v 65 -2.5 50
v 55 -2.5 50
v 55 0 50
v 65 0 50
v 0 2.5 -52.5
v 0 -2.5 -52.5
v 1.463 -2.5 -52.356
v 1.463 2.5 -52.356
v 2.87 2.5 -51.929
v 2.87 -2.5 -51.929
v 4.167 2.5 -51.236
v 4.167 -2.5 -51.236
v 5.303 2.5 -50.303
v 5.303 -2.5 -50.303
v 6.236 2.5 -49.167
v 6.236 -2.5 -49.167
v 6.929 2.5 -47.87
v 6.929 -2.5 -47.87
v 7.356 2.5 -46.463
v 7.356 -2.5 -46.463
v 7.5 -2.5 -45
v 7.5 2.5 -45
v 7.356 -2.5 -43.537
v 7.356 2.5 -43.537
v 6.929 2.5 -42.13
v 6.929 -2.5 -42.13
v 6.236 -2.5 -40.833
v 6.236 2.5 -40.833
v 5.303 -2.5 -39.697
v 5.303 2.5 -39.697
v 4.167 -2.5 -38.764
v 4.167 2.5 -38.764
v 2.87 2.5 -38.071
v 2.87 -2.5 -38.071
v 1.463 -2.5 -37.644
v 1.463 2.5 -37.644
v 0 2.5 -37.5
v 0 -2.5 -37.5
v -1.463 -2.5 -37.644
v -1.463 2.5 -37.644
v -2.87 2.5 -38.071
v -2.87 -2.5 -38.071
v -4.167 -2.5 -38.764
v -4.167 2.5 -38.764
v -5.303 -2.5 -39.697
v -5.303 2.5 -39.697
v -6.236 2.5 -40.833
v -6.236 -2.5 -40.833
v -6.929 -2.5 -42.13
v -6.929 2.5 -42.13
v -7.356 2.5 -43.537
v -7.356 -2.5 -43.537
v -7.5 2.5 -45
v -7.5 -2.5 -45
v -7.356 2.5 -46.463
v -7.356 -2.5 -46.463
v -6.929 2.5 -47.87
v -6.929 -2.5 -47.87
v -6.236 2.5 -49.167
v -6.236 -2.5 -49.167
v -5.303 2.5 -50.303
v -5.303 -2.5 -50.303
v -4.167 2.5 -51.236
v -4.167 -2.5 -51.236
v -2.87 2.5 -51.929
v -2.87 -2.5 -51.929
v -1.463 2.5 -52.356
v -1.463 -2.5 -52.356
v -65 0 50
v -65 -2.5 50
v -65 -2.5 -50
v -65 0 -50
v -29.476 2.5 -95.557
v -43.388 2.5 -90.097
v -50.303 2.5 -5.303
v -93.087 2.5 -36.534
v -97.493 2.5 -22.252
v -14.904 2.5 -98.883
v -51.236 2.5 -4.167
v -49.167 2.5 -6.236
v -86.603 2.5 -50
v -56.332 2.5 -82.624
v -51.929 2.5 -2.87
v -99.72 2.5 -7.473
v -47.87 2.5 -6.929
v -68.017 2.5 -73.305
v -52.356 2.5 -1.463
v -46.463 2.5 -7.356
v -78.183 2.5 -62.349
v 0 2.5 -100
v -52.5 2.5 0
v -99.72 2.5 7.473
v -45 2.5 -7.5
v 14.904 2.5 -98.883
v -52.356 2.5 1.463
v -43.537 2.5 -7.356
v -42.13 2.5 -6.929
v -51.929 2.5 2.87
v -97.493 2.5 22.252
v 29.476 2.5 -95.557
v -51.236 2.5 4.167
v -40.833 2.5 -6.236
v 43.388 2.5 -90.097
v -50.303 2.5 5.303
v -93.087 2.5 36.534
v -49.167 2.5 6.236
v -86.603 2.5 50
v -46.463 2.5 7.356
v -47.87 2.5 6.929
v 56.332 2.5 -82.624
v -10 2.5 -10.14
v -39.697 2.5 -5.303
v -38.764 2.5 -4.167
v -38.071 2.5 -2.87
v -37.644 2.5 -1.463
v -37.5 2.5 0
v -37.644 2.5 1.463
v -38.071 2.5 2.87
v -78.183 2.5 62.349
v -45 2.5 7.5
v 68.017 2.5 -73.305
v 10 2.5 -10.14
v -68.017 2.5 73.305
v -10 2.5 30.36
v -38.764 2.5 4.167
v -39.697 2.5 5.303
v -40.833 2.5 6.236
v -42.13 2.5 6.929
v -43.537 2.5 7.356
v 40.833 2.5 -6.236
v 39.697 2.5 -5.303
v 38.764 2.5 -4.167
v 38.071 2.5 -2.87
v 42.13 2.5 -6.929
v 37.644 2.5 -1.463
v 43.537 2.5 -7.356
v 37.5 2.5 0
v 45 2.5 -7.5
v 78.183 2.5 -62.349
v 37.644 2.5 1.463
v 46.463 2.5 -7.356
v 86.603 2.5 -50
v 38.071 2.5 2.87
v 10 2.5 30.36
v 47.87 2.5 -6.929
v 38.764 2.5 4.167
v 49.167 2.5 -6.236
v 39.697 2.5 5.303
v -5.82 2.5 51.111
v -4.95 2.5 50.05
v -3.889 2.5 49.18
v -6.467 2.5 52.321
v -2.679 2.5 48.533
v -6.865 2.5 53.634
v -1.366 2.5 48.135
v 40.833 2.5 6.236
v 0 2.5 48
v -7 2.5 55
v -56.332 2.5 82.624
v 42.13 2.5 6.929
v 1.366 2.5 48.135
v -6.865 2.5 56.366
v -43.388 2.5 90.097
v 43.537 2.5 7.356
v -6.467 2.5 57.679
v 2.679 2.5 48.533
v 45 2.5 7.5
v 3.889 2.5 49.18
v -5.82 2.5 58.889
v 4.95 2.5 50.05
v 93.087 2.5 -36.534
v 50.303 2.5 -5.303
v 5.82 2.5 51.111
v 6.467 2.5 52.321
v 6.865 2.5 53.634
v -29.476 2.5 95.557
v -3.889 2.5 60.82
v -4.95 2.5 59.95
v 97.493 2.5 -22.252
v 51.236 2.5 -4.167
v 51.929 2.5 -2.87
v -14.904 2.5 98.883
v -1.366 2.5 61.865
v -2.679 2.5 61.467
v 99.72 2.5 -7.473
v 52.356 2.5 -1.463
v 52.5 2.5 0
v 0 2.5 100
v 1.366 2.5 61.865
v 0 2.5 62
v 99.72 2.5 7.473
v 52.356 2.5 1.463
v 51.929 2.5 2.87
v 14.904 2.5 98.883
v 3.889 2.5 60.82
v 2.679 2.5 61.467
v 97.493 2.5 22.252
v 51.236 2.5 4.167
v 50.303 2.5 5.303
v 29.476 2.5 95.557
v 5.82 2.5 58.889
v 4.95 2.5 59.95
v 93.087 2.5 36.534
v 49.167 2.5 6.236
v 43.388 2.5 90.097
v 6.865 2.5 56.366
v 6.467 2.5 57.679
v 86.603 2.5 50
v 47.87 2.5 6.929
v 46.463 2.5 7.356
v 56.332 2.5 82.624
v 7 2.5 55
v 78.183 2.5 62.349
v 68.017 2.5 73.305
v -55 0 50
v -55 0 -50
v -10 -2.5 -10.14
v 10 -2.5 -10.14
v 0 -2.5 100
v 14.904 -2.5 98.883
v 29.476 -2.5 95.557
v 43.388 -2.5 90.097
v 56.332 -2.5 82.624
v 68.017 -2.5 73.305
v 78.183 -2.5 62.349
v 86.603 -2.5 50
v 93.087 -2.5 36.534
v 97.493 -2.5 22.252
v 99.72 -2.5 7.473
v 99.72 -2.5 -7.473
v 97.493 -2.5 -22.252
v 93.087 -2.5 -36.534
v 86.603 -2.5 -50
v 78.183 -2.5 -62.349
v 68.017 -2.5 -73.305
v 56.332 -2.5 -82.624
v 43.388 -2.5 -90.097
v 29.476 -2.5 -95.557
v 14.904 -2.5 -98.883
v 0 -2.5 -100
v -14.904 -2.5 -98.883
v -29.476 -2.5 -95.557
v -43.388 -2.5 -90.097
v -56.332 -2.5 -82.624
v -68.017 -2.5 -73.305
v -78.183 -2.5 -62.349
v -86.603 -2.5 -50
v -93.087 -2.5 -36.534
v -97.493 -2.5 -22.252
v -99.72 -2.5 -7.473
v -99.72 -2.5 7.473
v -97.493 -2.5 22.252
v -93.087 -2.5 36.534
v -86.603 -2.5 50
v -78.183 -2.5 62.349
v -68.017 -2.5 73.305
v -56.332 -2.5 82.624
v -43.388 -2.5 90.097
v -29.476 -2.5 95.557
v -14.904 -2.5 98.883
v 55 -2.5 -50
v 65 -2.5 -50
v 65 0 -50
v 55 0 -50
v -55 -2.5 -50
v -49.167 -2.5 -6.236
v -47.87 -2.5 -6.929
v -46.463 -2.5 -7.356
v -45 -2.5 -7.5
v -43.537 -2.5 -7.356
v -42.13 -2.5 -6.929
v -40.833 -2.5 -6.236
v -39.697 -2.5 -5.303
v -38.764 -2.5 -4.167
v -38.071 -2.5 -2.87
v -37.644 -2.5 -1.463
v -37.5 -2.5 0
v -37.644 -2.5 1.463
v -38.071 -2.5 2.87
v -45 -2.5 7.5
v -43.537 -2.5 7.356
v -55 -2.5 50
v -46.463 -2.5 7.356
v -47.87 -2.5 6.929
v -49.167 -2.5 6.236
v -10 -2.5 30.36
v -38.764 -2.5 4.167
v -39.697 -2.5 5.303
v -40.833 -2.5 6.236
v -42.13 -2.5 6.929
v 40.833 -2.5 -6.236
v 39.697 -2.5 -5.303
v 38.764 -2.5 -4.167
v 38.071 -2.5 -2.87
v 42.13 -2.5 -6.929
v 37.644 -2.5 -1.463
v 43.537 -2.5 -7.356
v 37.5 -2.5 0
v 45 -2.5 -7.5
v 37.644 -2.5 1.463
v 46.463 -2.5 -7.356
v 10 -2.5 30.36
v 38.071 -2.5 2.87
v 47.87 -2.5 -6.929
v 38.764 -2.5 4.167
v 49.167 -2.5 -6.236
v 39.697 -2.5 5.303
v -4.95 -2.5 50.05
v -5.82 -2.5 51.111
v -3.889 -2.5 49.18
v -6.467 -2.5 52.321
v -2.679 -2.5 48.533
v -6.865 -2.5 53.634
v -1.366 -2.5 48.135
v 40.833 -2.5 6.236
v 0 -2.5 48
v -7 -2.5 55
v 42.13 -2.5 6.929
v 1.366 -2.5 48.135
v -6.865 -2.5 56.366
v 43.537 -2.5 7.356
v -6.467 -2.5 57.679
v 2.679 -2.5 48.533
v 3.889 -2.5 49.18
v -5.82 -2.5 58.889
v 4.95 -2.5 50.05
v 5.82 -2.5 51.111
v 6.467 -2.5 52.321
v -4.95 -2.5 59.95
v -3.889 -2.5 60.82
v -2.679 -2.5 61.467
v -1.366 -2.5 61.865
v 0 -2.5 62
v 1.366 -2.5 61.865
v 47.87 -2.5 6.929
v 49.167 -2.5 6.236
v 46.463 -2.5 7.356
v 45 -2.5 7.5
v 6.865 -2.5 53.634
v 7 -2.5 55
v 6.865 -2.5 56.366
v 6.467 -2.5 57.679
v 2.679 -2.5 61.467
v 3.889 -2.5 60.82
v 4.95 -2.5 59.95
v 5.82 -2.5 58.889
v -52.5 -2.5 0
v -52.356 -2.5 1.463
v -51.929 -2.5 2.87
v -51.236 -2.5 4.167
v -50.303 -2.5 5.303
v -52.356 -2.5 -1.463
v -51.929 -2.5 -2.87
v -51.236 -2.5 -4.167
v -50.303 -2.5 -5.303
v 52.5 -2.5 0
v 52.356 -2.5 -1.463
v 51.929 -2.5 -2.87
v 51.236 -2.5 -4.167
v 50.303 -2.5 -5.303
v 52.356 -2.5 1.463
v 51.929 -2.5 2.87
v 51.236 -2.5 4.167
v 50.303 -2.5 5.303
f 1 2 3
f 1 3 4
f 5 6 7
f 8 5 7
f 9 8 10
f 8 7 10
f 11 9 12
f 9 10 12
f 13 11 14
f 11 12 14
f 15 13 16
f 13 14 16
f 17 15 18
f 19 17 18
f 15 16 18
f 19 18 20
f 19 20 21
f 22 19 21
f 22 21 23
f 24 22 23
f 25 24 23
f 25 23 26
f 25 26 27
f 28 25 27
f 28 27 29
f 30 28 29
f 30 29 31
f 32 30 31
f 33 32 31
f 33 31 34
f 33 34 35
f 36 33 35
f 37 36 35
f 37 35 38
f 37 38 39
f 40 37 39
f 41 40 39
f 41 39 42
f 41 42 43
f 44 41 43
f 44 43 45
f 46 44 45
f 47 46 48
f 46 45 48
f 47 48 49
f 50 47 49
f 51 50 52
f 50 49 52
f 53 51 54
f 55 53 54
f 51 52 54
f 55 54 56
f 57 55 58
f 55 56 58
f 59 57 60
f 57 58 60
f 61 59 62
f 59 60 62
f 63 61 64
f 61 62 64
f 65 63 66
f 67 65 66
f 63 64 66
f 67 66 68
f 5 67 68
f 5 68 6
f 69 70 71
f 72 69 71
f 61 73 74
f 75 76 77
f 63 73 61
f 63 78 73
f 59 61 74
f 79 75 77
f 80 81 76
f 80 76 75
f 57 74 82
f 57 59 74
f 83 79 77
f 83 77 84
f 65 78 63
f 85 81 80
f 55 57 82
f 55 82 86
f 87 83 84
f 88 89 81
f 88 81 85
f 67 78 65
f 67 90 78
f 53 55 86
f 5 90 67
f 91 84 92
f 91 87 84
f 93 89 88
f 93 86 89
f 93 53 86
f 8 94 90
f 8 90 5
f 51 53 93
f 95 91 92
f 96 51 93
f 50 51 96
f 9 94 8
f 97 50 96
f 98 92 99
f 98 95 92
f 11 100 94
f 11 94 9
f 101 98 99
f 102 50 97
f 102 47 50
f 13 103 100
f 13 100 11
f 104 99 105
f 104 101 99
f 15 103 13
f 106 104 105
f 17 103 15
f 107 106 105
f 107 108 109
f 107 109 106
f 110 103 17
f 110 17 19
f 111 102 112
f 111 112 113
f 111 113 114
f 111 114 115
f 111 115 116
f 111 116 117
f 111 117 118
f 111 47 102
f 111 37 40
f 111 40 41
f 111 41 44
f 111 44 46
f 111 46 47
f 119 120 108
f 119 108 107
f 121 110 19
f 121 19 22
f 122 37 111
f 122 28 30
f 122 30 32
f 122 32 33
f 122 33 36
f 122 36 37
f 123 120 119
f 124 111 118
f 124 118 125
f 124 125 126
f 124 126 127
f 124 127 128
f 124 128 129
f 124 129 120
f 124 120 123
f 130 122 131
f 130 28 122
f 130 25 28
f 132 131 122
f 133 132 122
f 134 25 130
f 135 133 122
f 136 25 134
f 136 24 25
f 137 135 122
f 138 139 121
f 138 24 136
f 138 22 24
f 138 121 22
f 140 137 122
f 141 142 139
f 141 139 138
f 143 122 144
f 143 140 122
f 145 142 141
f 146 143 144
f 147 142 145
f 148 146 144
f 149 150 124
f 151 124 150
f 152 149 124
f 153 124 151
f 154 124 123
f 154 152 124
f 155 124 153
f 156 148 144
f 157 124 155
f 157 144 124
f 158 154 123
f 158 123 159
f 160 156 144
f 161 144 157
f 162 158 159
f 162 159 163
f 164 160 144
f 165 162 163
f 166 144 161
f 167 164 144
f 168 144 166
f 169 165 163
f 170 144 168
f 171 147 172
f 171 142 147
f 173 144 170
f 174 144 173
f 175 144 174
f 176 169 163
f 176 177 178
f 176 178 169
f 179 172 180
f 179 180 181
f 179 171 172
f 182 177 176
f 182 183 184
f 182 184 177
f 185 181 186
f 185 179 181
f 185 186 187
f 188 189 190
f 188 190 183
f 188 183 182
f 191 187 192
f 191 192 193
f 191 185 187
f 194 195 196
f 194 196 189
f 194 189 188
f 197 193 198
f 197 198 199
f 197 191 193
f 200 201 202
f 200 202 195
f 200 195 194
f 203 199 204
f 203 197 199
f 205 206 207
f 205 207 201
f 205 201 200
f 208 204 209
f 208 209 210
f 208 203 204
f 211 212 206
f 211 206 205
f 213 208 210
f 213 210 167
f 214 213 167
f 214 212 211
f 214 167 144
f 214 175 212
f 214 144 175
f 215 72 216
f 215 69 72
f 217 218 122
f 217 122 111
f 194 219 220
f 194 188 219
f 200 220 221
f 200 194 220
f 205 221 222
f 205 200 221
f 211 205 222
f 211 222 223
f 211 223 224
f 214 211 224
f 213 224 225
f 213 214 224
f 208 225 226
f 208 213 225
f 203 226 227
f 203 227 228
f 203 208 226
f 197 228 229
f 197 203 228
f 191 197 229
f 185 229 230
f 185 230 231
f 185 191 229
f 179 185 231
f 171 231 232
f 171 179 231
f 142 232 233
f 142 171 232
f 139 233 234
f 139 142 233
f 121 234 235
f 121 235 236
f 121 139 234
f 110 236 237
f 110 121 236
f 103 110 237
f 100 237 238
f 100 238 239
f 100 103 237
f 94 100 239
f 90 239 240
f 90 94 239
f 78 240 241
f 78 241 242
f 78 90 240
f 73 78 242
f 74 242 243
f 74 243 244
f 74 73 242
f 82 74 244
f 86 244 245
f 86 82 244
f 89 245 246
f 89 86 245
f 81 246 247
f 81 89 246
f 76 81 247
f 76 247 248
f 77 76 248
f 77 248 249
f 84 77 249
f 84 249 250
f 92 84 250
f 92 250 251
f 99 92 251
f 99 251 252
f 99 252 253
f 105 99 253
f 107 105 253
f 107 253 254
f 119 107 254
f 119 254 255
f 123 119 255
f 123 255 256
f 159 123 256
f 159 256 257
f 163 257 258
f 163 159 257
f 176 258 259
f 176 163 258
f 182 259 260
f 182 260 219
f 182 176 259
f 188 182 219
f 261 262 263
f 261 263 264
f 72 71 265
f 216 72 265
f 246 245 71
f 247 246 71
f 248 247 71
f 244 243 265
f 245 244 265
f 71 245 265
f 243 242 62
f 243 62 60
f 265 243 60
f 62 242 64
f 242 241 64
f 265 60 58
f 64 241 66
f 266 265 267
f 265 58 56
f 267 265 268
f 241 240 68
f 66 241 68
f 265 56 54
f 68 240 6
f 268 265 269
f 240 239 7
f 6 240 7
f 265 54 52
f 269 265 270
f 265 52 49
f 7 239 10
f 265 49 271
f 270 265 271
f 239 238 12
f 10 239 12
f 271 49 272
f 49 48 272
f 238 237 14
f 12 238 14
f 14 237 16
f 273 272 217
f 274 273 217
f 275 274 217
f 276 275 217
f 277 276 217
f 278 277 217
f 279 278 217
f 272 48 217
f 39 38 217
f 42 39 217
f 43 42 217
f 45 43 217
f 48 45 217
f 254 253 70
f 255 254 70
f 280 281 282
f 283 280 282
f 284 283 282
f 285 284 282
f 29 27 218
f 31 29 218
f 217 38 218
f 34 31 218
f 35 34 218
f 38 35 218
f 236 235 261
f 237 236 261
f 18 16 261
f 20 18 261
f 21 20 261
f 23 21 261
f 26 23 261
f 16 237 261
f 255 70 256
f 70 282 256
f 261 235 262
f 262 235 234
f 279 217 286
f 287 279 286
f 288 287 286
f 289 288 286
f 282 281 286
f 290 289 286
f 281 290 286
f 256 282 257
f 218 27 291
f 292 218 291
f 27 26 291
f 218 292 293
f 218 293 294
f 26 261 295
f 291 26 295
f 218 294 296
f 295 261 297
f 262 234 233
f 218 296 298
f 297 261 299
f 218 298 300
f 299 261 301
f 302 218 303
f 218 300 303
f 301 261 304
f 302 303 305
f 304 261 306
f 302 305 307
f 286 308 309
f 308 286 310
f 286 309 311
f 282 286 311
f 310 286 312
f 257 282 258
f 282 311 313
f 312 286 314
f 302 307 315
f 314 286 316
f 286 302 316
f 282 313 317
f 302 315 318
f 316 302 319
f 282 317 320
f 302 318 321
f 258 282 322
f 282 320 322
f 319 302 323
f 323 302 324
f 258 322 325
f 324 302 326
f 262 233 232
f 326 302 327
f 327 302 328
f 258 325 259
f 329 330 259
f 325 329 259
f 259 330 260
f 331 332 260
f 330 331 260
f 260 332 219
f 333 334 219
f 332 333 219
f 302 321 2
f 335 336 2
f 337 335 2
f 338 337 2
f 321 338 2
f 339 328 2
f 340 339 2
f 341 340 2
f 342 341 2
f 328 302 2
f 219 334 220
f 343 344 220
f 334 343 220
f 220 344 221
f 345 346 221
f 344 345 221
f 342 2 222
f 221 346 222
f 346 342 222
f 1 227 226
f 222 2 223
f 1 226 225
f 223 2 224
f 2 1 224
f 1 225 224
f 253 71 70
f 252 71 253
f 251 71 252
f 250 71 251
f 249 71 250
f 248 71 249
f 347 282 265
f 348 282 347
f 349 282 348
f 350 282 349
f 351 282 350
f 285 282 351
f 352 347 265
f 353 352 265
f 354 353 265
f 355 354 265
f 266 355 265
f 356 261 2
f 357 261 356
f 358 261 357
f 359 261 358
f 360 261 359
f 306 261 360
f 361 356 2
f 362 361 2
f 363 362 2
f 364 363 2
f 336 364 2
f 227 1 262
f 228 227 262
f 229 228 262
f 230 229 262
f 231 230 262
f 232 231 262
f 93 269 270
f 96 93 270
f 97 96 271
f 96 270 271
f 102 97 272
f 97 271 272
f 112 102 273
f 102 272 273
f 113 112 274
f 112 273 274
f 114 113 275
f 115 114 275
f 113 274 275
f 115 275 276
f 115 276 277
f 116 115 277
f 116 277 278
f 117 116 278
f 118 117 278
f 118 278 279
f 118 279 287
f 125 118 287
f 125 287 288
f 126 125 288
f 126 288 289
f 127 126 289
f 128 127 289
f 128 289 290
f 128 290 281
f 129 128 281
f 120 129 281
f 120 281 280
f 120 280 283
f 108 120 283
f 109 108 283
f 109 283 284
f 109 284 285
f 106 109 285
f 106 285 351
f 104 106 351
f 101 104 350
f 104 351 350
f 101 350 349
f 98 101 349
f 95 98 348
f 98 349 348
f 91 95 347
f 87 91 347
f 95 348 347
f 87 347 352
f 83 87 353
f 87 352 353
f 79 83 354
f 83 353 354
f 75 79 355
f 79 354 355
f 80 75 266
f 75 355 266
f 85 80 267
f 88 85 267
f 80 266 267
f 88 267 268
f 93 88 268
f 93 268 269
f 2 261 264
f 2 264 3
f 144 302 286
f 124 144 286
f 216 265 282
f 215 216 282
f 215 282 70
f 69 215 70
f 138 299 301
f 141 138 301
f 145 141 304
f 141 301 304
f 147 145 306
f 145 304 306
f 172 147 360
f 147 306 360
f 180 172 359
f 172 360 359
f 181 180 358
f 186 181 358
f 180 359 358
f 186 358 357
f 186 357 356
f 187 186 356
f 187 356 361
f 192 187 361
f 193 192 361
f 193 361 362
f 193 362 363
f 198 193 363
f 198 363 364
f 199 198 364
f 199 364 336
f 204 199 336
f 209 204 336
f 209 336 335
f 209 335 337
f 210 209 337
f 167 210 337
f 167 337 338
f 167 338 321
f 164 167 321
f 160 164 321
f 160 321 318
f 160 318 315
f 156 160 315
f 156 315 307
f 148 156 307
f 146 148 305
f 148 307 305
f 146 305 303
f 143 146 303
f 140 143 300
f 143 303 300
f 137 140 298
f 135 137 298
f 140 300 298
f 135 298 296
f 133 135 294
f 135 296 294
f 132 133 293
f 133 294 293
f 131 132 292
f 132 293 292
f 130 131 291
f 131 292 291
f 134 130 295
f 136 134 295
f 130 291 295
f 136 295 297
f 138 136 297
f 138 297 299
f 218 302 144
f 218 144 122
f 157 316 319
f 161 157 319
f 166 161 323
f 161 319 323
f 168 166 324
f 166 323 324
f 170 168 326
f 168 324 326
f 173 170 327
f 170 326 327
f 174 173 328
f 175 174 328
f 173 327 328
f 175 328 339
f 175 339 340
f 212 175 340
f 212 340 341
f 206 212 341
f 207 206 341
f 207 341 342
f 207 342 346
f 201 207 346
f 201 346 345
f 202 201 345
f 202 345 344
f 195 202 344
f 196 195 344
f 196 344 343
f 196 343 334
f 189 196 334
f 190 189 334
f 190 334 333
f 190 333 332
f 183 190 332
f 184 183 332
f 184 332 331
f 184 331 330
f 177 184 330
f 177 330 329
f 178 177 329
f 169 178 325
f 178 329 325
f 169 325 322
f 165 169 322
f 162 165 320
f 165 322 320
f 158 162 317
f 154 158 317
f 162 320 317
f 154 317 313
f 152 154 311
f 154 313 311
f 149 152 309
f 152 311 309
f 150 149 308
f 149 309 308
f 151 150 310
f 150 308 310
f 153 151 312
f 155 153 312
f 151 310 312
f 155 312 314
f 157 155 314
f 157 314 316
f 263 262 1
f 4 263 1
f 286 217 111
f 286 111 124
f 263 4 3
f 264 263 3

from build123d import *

# Parameters (mm, degrees)
SKETCH2_R           = 100
BOSS_EXTRUDE1_DEPTH = 2.5
CUT_EXTRUDE1_DEPTH  = 2.5
CUT_EXTRUDE2_DEPTH  = 10
SKETCH6_R           = 7.5
SKETCH6_R_2         = 7
CUT_EXTRUDE3_DEPTH  = 10


with BuildPart() as part:
    # Sketch2 → Boss-Extrude1 (new, symmetric)
    with BuildSketch(Plane(origin=(0, 0, 0), x_dir=(1, 0, 0), z_dir=(0, 1, 0))):
        with Locations(Location((0, 0, 0), (0, 0, 270))):
            Circle(SKETCH2_R)
    extrude(amount=BOSS_EXTRUDE1_DEPTH, both=True)

    # Sketch3 → Cut-Extrude1 (cut)
    with BuildSketch(Plane.XZ.offset(2.5)):
        Polygon((-65, 0), (-65, -50), (-55, -50), (-55, 50), (-65, 50), align=None)
        Polygon((55, 50), (65, 50), (65, 0), (65, -50), (55, -50), align=None)
    extrude(amount=-CUT_EXTRUDE1_DEPTH, mode=Mode.SUBTRACT)

    # Sketch5 → Cut-Extrude2 (cut)
    with BuildSketch(Plane.XZ.offset(2.5)):
        Polygon((0, 30.36), (10, 30.36), (10, -10.14), (-10, -10.14), (-10, 30.36), align=None)
    extrude(amount=-CUT_EXTRUDE2_DEPTH, mode=Mode.SUBTRACT)

    # Sketch6 → Cut-Extrude3 (cut)
    with BuildSketch(Plane.XZ.offset(2.5)):
        with Locations(Location((-45, 0, 0), (0, 0, 270))):
            Circle(SKETCH6_R)
        with Locations(Location((0, -45, 0), (0, 0, 270))):
            Circle(SKETCH6_R)
        with Locations(Location((45, 0, 0), (0, 0, 270))):
            Circle(SKETCH6_R)
        with Locations(Location((0, 55, 0), (0, 0, 270))):
            Circle(SKETCH6_R_2)
    extrude(amount=-CUT_EXTRUDE3_DEPTH, mode=Mode.SUBTRACT)


solid = part.part
